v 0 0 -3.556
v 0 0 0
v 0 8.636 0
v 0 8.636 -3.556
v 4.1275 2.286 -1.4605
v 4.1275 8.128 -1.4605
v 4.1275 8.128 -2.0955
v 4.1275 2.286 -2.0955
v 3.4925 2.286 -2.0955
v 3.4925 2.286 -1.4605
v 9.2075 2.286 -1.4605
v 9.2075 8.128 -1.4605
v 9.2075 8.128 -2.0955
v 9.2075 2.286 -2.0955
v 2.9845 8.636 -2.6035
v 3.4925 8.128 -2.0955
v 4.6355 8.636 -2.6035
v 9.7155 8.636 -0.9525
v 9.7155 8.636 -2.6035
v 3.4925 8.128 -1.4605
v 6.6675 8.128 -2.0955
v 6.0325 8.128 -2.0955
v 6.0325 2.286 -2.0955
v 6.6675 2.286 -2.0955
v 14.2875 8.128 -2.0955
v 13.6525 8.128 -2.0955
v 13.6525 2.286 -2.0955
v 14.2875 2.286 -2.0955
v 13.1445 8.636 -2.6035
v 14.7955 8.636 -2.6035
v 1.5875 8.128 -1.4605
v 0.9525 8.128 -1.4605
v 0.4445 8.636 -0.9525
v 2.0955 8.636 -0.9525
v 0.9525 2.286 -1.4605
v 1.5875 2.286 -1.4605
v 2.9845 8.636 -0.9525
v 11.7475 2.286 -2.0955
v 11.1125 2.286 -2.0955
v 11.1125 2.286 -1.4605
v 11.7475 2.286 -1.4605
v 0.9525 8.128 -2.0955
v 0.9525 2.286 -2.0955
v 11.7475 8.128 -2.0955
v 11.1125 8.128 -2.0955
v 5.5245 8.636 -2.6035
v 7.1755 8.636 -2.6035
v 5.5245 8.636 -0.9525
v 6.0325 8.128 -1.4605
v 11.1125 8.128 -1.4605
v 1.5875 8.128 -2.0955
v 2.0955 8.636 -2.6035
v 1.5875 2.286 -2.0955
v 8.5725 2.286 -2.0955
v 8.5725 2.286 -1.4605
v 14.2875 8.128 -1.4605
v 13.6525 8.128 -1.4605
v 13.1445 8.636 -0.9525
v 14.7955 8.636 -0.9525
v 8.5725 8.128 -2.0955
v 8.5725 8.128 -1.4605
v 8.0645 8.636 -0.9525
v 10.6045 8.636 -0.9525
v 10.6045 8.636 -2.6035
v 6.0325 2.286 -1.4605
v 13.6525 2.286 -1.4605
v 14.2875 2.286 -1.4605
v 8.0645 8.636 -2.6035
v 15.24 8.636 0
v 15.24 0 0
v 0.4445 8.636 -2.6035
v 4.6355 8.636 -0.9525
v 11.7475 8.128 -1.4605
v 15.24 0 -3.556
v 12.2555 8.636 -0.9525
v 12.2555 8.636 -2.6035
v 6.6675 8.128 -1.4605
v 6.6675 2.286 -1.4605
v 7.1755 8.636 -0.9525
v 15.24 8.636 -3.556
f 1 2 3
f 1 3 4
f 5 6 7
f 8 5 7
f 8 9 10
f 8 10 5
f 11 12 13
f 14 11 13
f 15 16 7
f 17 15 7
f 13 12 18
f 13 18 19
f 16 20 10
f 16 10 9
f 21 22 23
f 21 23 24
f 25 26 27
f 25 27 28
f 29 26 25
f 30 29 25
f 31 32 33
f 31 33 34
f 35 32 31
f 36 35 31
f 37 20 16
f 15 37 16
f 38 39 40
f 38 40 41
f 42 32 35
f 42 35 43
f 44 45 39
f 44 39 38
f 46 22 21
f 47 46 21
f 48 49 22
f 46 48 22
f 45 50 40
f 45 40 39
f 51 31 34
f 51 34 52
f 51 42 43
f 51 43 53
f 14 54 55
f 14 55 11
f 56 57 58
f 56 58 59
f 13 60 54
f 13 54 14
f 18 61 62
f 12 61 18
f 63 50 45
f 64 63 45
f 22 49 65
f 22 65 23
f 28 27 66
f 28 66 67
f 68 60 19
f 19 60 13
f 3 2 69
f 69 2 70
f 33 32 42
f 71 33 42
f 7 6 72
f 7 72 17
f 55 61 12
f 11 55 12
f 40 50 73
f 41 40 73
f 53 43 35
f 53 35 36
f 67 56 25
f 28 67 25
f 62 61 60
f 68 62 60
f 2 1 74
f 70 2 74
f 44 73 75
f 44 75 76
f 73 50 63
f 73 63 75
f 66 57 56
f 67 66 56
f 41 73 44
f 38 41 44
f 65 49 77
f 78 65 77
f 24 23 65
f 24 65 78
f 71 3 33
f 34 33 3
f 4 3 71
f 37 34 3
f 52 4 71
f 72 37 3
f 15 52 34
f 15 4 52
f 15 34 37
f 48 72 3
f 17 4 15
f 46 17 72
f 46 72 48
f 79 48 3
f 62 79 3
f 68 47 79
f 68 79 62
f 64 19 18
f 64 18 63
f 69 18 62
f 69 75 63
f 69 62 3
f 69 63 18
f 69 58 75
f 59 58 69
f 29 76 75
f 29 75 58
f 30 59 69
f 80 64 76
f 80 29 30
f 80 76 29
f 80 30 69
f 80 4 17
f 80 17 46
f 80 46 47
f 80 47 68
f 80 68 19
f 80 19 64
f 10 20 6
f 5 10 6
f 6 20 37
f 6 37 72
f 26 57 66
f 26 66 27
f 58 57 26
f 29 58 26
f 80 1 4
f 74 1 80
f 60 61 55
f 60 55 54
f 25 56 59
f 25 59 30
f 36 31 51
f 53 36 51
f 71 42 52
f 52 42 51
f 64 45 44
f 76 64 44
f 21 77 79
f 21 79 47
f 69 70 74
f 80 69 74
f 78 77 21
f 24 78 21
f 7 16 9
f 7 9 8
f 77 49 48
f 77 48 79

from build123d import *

# Parameters (mm, degrees)
SKETCH1_W                  = 15.24
SKETCH1_H                  = 3.556
BOSS_EXTRUDE1_DEPTH        = 8.636
SKETCH2_W                  = 0.635
SKETCH2_H                  = 0.635
CUT_EXTRUDE1_DEPTH         = 6.35
CHAMFER1_SIZE              = 0.508
LPATTERN1_COUNT            = 6
LPATTERN1_PITCH            = 2.54
CHAMFER1_OF_LPATTERN1_SIZE = 0.508


with BuildPart() as part:
    # Sketch1 → Boss-Extrude1 (new body)
    with BuildSketch(Plane(origin=(0, 0, 0), x_dir=(1, 0, 0), z_dir=(0, 1, 0))):
        with Locations((7.62, 1.778)):
            Rectangle(SKETCH1_W, SKETCH1_H)
    extrude(amount=BOSS_EXTRUDE1_DEPTH)

    # Sketch2 → Cut-Extrude1 (cut)
    with BuildSketch(Plane(origin=(0, 8.636, 0), x_dir=(1, 0, 0), z_dir=(0, 1, 0))):
        with Locations((1.27, 1.778)):
            Rectangle(SKETCH2_W, SKETCH2_H)
    cut_extrude1 = extrude(amount=-CUT_EXTRUDE1_DEPTH, mode=Mode.SUBTRACT)

    # Chamfer1
    chamfer1_edges = [part.edges().sort_by_distance(p)[0] for p in [
        (1.5875, 8.636, -1.778),
        (1.27, 8.636, -2.0955),
        (0.9525, 8.636, -1.778),
        (1.27, 8.636, -1.4605),
    ]]
    chamfer(chamfer1_edges, length=CHAMFER1_SIZE)

    # LPattern1: Cut-Extrude1 ×6
    with Locations(*[(i * LPATTERN1_PITCH, 0, 0) for i in range(1, LPATTERN1_COUNT)]):
        add(cut_extrude1, mode=Mode.SUBTRACT)

    # Chamfer1 of LPattern1
    chamfer1_of_lpattern1_edges = [part.edges().sort_by_distance(p)[0] for p in [
        (4.1275, 8.636, -1.778),
        (3.81, 8.636, -2.0955),
        (3.4925, 8.636, -1.778),
        (3.81, 8.636, -1.4605),
        (6.6675, 8.636, -1.778),
        (6.35, 8.636, -2.0955),
        (6.0325, 8.636, -1.778),
        (6.35, 8.636, -1.4605),
        (9.2075, 8.636, -1.778),
        (8.89, 8.636, -2.0955),
        (8.5725, 8.636, -1.778),
        (8.89, 8.636, -1.4605),
        (11.7475, 8.636, -1.778),
        (11.43, 8.636, -2.0955),
        (11.1125, 8.636, -1.778),
        (11.43, 8.636, -1.4605),
        (14.2875, 8.636, -1.778),
        (13.97, 8.636, -2.0955),
        (13.6525, 8.636, -1.778),
        (13.97, 8.636, -1.4605),
    ]]
    chamfer(chamfer1_of_lpattern1_edges, length=CHAMFER1_OF_LPATTERN1_SIZE)


solid = part.part
